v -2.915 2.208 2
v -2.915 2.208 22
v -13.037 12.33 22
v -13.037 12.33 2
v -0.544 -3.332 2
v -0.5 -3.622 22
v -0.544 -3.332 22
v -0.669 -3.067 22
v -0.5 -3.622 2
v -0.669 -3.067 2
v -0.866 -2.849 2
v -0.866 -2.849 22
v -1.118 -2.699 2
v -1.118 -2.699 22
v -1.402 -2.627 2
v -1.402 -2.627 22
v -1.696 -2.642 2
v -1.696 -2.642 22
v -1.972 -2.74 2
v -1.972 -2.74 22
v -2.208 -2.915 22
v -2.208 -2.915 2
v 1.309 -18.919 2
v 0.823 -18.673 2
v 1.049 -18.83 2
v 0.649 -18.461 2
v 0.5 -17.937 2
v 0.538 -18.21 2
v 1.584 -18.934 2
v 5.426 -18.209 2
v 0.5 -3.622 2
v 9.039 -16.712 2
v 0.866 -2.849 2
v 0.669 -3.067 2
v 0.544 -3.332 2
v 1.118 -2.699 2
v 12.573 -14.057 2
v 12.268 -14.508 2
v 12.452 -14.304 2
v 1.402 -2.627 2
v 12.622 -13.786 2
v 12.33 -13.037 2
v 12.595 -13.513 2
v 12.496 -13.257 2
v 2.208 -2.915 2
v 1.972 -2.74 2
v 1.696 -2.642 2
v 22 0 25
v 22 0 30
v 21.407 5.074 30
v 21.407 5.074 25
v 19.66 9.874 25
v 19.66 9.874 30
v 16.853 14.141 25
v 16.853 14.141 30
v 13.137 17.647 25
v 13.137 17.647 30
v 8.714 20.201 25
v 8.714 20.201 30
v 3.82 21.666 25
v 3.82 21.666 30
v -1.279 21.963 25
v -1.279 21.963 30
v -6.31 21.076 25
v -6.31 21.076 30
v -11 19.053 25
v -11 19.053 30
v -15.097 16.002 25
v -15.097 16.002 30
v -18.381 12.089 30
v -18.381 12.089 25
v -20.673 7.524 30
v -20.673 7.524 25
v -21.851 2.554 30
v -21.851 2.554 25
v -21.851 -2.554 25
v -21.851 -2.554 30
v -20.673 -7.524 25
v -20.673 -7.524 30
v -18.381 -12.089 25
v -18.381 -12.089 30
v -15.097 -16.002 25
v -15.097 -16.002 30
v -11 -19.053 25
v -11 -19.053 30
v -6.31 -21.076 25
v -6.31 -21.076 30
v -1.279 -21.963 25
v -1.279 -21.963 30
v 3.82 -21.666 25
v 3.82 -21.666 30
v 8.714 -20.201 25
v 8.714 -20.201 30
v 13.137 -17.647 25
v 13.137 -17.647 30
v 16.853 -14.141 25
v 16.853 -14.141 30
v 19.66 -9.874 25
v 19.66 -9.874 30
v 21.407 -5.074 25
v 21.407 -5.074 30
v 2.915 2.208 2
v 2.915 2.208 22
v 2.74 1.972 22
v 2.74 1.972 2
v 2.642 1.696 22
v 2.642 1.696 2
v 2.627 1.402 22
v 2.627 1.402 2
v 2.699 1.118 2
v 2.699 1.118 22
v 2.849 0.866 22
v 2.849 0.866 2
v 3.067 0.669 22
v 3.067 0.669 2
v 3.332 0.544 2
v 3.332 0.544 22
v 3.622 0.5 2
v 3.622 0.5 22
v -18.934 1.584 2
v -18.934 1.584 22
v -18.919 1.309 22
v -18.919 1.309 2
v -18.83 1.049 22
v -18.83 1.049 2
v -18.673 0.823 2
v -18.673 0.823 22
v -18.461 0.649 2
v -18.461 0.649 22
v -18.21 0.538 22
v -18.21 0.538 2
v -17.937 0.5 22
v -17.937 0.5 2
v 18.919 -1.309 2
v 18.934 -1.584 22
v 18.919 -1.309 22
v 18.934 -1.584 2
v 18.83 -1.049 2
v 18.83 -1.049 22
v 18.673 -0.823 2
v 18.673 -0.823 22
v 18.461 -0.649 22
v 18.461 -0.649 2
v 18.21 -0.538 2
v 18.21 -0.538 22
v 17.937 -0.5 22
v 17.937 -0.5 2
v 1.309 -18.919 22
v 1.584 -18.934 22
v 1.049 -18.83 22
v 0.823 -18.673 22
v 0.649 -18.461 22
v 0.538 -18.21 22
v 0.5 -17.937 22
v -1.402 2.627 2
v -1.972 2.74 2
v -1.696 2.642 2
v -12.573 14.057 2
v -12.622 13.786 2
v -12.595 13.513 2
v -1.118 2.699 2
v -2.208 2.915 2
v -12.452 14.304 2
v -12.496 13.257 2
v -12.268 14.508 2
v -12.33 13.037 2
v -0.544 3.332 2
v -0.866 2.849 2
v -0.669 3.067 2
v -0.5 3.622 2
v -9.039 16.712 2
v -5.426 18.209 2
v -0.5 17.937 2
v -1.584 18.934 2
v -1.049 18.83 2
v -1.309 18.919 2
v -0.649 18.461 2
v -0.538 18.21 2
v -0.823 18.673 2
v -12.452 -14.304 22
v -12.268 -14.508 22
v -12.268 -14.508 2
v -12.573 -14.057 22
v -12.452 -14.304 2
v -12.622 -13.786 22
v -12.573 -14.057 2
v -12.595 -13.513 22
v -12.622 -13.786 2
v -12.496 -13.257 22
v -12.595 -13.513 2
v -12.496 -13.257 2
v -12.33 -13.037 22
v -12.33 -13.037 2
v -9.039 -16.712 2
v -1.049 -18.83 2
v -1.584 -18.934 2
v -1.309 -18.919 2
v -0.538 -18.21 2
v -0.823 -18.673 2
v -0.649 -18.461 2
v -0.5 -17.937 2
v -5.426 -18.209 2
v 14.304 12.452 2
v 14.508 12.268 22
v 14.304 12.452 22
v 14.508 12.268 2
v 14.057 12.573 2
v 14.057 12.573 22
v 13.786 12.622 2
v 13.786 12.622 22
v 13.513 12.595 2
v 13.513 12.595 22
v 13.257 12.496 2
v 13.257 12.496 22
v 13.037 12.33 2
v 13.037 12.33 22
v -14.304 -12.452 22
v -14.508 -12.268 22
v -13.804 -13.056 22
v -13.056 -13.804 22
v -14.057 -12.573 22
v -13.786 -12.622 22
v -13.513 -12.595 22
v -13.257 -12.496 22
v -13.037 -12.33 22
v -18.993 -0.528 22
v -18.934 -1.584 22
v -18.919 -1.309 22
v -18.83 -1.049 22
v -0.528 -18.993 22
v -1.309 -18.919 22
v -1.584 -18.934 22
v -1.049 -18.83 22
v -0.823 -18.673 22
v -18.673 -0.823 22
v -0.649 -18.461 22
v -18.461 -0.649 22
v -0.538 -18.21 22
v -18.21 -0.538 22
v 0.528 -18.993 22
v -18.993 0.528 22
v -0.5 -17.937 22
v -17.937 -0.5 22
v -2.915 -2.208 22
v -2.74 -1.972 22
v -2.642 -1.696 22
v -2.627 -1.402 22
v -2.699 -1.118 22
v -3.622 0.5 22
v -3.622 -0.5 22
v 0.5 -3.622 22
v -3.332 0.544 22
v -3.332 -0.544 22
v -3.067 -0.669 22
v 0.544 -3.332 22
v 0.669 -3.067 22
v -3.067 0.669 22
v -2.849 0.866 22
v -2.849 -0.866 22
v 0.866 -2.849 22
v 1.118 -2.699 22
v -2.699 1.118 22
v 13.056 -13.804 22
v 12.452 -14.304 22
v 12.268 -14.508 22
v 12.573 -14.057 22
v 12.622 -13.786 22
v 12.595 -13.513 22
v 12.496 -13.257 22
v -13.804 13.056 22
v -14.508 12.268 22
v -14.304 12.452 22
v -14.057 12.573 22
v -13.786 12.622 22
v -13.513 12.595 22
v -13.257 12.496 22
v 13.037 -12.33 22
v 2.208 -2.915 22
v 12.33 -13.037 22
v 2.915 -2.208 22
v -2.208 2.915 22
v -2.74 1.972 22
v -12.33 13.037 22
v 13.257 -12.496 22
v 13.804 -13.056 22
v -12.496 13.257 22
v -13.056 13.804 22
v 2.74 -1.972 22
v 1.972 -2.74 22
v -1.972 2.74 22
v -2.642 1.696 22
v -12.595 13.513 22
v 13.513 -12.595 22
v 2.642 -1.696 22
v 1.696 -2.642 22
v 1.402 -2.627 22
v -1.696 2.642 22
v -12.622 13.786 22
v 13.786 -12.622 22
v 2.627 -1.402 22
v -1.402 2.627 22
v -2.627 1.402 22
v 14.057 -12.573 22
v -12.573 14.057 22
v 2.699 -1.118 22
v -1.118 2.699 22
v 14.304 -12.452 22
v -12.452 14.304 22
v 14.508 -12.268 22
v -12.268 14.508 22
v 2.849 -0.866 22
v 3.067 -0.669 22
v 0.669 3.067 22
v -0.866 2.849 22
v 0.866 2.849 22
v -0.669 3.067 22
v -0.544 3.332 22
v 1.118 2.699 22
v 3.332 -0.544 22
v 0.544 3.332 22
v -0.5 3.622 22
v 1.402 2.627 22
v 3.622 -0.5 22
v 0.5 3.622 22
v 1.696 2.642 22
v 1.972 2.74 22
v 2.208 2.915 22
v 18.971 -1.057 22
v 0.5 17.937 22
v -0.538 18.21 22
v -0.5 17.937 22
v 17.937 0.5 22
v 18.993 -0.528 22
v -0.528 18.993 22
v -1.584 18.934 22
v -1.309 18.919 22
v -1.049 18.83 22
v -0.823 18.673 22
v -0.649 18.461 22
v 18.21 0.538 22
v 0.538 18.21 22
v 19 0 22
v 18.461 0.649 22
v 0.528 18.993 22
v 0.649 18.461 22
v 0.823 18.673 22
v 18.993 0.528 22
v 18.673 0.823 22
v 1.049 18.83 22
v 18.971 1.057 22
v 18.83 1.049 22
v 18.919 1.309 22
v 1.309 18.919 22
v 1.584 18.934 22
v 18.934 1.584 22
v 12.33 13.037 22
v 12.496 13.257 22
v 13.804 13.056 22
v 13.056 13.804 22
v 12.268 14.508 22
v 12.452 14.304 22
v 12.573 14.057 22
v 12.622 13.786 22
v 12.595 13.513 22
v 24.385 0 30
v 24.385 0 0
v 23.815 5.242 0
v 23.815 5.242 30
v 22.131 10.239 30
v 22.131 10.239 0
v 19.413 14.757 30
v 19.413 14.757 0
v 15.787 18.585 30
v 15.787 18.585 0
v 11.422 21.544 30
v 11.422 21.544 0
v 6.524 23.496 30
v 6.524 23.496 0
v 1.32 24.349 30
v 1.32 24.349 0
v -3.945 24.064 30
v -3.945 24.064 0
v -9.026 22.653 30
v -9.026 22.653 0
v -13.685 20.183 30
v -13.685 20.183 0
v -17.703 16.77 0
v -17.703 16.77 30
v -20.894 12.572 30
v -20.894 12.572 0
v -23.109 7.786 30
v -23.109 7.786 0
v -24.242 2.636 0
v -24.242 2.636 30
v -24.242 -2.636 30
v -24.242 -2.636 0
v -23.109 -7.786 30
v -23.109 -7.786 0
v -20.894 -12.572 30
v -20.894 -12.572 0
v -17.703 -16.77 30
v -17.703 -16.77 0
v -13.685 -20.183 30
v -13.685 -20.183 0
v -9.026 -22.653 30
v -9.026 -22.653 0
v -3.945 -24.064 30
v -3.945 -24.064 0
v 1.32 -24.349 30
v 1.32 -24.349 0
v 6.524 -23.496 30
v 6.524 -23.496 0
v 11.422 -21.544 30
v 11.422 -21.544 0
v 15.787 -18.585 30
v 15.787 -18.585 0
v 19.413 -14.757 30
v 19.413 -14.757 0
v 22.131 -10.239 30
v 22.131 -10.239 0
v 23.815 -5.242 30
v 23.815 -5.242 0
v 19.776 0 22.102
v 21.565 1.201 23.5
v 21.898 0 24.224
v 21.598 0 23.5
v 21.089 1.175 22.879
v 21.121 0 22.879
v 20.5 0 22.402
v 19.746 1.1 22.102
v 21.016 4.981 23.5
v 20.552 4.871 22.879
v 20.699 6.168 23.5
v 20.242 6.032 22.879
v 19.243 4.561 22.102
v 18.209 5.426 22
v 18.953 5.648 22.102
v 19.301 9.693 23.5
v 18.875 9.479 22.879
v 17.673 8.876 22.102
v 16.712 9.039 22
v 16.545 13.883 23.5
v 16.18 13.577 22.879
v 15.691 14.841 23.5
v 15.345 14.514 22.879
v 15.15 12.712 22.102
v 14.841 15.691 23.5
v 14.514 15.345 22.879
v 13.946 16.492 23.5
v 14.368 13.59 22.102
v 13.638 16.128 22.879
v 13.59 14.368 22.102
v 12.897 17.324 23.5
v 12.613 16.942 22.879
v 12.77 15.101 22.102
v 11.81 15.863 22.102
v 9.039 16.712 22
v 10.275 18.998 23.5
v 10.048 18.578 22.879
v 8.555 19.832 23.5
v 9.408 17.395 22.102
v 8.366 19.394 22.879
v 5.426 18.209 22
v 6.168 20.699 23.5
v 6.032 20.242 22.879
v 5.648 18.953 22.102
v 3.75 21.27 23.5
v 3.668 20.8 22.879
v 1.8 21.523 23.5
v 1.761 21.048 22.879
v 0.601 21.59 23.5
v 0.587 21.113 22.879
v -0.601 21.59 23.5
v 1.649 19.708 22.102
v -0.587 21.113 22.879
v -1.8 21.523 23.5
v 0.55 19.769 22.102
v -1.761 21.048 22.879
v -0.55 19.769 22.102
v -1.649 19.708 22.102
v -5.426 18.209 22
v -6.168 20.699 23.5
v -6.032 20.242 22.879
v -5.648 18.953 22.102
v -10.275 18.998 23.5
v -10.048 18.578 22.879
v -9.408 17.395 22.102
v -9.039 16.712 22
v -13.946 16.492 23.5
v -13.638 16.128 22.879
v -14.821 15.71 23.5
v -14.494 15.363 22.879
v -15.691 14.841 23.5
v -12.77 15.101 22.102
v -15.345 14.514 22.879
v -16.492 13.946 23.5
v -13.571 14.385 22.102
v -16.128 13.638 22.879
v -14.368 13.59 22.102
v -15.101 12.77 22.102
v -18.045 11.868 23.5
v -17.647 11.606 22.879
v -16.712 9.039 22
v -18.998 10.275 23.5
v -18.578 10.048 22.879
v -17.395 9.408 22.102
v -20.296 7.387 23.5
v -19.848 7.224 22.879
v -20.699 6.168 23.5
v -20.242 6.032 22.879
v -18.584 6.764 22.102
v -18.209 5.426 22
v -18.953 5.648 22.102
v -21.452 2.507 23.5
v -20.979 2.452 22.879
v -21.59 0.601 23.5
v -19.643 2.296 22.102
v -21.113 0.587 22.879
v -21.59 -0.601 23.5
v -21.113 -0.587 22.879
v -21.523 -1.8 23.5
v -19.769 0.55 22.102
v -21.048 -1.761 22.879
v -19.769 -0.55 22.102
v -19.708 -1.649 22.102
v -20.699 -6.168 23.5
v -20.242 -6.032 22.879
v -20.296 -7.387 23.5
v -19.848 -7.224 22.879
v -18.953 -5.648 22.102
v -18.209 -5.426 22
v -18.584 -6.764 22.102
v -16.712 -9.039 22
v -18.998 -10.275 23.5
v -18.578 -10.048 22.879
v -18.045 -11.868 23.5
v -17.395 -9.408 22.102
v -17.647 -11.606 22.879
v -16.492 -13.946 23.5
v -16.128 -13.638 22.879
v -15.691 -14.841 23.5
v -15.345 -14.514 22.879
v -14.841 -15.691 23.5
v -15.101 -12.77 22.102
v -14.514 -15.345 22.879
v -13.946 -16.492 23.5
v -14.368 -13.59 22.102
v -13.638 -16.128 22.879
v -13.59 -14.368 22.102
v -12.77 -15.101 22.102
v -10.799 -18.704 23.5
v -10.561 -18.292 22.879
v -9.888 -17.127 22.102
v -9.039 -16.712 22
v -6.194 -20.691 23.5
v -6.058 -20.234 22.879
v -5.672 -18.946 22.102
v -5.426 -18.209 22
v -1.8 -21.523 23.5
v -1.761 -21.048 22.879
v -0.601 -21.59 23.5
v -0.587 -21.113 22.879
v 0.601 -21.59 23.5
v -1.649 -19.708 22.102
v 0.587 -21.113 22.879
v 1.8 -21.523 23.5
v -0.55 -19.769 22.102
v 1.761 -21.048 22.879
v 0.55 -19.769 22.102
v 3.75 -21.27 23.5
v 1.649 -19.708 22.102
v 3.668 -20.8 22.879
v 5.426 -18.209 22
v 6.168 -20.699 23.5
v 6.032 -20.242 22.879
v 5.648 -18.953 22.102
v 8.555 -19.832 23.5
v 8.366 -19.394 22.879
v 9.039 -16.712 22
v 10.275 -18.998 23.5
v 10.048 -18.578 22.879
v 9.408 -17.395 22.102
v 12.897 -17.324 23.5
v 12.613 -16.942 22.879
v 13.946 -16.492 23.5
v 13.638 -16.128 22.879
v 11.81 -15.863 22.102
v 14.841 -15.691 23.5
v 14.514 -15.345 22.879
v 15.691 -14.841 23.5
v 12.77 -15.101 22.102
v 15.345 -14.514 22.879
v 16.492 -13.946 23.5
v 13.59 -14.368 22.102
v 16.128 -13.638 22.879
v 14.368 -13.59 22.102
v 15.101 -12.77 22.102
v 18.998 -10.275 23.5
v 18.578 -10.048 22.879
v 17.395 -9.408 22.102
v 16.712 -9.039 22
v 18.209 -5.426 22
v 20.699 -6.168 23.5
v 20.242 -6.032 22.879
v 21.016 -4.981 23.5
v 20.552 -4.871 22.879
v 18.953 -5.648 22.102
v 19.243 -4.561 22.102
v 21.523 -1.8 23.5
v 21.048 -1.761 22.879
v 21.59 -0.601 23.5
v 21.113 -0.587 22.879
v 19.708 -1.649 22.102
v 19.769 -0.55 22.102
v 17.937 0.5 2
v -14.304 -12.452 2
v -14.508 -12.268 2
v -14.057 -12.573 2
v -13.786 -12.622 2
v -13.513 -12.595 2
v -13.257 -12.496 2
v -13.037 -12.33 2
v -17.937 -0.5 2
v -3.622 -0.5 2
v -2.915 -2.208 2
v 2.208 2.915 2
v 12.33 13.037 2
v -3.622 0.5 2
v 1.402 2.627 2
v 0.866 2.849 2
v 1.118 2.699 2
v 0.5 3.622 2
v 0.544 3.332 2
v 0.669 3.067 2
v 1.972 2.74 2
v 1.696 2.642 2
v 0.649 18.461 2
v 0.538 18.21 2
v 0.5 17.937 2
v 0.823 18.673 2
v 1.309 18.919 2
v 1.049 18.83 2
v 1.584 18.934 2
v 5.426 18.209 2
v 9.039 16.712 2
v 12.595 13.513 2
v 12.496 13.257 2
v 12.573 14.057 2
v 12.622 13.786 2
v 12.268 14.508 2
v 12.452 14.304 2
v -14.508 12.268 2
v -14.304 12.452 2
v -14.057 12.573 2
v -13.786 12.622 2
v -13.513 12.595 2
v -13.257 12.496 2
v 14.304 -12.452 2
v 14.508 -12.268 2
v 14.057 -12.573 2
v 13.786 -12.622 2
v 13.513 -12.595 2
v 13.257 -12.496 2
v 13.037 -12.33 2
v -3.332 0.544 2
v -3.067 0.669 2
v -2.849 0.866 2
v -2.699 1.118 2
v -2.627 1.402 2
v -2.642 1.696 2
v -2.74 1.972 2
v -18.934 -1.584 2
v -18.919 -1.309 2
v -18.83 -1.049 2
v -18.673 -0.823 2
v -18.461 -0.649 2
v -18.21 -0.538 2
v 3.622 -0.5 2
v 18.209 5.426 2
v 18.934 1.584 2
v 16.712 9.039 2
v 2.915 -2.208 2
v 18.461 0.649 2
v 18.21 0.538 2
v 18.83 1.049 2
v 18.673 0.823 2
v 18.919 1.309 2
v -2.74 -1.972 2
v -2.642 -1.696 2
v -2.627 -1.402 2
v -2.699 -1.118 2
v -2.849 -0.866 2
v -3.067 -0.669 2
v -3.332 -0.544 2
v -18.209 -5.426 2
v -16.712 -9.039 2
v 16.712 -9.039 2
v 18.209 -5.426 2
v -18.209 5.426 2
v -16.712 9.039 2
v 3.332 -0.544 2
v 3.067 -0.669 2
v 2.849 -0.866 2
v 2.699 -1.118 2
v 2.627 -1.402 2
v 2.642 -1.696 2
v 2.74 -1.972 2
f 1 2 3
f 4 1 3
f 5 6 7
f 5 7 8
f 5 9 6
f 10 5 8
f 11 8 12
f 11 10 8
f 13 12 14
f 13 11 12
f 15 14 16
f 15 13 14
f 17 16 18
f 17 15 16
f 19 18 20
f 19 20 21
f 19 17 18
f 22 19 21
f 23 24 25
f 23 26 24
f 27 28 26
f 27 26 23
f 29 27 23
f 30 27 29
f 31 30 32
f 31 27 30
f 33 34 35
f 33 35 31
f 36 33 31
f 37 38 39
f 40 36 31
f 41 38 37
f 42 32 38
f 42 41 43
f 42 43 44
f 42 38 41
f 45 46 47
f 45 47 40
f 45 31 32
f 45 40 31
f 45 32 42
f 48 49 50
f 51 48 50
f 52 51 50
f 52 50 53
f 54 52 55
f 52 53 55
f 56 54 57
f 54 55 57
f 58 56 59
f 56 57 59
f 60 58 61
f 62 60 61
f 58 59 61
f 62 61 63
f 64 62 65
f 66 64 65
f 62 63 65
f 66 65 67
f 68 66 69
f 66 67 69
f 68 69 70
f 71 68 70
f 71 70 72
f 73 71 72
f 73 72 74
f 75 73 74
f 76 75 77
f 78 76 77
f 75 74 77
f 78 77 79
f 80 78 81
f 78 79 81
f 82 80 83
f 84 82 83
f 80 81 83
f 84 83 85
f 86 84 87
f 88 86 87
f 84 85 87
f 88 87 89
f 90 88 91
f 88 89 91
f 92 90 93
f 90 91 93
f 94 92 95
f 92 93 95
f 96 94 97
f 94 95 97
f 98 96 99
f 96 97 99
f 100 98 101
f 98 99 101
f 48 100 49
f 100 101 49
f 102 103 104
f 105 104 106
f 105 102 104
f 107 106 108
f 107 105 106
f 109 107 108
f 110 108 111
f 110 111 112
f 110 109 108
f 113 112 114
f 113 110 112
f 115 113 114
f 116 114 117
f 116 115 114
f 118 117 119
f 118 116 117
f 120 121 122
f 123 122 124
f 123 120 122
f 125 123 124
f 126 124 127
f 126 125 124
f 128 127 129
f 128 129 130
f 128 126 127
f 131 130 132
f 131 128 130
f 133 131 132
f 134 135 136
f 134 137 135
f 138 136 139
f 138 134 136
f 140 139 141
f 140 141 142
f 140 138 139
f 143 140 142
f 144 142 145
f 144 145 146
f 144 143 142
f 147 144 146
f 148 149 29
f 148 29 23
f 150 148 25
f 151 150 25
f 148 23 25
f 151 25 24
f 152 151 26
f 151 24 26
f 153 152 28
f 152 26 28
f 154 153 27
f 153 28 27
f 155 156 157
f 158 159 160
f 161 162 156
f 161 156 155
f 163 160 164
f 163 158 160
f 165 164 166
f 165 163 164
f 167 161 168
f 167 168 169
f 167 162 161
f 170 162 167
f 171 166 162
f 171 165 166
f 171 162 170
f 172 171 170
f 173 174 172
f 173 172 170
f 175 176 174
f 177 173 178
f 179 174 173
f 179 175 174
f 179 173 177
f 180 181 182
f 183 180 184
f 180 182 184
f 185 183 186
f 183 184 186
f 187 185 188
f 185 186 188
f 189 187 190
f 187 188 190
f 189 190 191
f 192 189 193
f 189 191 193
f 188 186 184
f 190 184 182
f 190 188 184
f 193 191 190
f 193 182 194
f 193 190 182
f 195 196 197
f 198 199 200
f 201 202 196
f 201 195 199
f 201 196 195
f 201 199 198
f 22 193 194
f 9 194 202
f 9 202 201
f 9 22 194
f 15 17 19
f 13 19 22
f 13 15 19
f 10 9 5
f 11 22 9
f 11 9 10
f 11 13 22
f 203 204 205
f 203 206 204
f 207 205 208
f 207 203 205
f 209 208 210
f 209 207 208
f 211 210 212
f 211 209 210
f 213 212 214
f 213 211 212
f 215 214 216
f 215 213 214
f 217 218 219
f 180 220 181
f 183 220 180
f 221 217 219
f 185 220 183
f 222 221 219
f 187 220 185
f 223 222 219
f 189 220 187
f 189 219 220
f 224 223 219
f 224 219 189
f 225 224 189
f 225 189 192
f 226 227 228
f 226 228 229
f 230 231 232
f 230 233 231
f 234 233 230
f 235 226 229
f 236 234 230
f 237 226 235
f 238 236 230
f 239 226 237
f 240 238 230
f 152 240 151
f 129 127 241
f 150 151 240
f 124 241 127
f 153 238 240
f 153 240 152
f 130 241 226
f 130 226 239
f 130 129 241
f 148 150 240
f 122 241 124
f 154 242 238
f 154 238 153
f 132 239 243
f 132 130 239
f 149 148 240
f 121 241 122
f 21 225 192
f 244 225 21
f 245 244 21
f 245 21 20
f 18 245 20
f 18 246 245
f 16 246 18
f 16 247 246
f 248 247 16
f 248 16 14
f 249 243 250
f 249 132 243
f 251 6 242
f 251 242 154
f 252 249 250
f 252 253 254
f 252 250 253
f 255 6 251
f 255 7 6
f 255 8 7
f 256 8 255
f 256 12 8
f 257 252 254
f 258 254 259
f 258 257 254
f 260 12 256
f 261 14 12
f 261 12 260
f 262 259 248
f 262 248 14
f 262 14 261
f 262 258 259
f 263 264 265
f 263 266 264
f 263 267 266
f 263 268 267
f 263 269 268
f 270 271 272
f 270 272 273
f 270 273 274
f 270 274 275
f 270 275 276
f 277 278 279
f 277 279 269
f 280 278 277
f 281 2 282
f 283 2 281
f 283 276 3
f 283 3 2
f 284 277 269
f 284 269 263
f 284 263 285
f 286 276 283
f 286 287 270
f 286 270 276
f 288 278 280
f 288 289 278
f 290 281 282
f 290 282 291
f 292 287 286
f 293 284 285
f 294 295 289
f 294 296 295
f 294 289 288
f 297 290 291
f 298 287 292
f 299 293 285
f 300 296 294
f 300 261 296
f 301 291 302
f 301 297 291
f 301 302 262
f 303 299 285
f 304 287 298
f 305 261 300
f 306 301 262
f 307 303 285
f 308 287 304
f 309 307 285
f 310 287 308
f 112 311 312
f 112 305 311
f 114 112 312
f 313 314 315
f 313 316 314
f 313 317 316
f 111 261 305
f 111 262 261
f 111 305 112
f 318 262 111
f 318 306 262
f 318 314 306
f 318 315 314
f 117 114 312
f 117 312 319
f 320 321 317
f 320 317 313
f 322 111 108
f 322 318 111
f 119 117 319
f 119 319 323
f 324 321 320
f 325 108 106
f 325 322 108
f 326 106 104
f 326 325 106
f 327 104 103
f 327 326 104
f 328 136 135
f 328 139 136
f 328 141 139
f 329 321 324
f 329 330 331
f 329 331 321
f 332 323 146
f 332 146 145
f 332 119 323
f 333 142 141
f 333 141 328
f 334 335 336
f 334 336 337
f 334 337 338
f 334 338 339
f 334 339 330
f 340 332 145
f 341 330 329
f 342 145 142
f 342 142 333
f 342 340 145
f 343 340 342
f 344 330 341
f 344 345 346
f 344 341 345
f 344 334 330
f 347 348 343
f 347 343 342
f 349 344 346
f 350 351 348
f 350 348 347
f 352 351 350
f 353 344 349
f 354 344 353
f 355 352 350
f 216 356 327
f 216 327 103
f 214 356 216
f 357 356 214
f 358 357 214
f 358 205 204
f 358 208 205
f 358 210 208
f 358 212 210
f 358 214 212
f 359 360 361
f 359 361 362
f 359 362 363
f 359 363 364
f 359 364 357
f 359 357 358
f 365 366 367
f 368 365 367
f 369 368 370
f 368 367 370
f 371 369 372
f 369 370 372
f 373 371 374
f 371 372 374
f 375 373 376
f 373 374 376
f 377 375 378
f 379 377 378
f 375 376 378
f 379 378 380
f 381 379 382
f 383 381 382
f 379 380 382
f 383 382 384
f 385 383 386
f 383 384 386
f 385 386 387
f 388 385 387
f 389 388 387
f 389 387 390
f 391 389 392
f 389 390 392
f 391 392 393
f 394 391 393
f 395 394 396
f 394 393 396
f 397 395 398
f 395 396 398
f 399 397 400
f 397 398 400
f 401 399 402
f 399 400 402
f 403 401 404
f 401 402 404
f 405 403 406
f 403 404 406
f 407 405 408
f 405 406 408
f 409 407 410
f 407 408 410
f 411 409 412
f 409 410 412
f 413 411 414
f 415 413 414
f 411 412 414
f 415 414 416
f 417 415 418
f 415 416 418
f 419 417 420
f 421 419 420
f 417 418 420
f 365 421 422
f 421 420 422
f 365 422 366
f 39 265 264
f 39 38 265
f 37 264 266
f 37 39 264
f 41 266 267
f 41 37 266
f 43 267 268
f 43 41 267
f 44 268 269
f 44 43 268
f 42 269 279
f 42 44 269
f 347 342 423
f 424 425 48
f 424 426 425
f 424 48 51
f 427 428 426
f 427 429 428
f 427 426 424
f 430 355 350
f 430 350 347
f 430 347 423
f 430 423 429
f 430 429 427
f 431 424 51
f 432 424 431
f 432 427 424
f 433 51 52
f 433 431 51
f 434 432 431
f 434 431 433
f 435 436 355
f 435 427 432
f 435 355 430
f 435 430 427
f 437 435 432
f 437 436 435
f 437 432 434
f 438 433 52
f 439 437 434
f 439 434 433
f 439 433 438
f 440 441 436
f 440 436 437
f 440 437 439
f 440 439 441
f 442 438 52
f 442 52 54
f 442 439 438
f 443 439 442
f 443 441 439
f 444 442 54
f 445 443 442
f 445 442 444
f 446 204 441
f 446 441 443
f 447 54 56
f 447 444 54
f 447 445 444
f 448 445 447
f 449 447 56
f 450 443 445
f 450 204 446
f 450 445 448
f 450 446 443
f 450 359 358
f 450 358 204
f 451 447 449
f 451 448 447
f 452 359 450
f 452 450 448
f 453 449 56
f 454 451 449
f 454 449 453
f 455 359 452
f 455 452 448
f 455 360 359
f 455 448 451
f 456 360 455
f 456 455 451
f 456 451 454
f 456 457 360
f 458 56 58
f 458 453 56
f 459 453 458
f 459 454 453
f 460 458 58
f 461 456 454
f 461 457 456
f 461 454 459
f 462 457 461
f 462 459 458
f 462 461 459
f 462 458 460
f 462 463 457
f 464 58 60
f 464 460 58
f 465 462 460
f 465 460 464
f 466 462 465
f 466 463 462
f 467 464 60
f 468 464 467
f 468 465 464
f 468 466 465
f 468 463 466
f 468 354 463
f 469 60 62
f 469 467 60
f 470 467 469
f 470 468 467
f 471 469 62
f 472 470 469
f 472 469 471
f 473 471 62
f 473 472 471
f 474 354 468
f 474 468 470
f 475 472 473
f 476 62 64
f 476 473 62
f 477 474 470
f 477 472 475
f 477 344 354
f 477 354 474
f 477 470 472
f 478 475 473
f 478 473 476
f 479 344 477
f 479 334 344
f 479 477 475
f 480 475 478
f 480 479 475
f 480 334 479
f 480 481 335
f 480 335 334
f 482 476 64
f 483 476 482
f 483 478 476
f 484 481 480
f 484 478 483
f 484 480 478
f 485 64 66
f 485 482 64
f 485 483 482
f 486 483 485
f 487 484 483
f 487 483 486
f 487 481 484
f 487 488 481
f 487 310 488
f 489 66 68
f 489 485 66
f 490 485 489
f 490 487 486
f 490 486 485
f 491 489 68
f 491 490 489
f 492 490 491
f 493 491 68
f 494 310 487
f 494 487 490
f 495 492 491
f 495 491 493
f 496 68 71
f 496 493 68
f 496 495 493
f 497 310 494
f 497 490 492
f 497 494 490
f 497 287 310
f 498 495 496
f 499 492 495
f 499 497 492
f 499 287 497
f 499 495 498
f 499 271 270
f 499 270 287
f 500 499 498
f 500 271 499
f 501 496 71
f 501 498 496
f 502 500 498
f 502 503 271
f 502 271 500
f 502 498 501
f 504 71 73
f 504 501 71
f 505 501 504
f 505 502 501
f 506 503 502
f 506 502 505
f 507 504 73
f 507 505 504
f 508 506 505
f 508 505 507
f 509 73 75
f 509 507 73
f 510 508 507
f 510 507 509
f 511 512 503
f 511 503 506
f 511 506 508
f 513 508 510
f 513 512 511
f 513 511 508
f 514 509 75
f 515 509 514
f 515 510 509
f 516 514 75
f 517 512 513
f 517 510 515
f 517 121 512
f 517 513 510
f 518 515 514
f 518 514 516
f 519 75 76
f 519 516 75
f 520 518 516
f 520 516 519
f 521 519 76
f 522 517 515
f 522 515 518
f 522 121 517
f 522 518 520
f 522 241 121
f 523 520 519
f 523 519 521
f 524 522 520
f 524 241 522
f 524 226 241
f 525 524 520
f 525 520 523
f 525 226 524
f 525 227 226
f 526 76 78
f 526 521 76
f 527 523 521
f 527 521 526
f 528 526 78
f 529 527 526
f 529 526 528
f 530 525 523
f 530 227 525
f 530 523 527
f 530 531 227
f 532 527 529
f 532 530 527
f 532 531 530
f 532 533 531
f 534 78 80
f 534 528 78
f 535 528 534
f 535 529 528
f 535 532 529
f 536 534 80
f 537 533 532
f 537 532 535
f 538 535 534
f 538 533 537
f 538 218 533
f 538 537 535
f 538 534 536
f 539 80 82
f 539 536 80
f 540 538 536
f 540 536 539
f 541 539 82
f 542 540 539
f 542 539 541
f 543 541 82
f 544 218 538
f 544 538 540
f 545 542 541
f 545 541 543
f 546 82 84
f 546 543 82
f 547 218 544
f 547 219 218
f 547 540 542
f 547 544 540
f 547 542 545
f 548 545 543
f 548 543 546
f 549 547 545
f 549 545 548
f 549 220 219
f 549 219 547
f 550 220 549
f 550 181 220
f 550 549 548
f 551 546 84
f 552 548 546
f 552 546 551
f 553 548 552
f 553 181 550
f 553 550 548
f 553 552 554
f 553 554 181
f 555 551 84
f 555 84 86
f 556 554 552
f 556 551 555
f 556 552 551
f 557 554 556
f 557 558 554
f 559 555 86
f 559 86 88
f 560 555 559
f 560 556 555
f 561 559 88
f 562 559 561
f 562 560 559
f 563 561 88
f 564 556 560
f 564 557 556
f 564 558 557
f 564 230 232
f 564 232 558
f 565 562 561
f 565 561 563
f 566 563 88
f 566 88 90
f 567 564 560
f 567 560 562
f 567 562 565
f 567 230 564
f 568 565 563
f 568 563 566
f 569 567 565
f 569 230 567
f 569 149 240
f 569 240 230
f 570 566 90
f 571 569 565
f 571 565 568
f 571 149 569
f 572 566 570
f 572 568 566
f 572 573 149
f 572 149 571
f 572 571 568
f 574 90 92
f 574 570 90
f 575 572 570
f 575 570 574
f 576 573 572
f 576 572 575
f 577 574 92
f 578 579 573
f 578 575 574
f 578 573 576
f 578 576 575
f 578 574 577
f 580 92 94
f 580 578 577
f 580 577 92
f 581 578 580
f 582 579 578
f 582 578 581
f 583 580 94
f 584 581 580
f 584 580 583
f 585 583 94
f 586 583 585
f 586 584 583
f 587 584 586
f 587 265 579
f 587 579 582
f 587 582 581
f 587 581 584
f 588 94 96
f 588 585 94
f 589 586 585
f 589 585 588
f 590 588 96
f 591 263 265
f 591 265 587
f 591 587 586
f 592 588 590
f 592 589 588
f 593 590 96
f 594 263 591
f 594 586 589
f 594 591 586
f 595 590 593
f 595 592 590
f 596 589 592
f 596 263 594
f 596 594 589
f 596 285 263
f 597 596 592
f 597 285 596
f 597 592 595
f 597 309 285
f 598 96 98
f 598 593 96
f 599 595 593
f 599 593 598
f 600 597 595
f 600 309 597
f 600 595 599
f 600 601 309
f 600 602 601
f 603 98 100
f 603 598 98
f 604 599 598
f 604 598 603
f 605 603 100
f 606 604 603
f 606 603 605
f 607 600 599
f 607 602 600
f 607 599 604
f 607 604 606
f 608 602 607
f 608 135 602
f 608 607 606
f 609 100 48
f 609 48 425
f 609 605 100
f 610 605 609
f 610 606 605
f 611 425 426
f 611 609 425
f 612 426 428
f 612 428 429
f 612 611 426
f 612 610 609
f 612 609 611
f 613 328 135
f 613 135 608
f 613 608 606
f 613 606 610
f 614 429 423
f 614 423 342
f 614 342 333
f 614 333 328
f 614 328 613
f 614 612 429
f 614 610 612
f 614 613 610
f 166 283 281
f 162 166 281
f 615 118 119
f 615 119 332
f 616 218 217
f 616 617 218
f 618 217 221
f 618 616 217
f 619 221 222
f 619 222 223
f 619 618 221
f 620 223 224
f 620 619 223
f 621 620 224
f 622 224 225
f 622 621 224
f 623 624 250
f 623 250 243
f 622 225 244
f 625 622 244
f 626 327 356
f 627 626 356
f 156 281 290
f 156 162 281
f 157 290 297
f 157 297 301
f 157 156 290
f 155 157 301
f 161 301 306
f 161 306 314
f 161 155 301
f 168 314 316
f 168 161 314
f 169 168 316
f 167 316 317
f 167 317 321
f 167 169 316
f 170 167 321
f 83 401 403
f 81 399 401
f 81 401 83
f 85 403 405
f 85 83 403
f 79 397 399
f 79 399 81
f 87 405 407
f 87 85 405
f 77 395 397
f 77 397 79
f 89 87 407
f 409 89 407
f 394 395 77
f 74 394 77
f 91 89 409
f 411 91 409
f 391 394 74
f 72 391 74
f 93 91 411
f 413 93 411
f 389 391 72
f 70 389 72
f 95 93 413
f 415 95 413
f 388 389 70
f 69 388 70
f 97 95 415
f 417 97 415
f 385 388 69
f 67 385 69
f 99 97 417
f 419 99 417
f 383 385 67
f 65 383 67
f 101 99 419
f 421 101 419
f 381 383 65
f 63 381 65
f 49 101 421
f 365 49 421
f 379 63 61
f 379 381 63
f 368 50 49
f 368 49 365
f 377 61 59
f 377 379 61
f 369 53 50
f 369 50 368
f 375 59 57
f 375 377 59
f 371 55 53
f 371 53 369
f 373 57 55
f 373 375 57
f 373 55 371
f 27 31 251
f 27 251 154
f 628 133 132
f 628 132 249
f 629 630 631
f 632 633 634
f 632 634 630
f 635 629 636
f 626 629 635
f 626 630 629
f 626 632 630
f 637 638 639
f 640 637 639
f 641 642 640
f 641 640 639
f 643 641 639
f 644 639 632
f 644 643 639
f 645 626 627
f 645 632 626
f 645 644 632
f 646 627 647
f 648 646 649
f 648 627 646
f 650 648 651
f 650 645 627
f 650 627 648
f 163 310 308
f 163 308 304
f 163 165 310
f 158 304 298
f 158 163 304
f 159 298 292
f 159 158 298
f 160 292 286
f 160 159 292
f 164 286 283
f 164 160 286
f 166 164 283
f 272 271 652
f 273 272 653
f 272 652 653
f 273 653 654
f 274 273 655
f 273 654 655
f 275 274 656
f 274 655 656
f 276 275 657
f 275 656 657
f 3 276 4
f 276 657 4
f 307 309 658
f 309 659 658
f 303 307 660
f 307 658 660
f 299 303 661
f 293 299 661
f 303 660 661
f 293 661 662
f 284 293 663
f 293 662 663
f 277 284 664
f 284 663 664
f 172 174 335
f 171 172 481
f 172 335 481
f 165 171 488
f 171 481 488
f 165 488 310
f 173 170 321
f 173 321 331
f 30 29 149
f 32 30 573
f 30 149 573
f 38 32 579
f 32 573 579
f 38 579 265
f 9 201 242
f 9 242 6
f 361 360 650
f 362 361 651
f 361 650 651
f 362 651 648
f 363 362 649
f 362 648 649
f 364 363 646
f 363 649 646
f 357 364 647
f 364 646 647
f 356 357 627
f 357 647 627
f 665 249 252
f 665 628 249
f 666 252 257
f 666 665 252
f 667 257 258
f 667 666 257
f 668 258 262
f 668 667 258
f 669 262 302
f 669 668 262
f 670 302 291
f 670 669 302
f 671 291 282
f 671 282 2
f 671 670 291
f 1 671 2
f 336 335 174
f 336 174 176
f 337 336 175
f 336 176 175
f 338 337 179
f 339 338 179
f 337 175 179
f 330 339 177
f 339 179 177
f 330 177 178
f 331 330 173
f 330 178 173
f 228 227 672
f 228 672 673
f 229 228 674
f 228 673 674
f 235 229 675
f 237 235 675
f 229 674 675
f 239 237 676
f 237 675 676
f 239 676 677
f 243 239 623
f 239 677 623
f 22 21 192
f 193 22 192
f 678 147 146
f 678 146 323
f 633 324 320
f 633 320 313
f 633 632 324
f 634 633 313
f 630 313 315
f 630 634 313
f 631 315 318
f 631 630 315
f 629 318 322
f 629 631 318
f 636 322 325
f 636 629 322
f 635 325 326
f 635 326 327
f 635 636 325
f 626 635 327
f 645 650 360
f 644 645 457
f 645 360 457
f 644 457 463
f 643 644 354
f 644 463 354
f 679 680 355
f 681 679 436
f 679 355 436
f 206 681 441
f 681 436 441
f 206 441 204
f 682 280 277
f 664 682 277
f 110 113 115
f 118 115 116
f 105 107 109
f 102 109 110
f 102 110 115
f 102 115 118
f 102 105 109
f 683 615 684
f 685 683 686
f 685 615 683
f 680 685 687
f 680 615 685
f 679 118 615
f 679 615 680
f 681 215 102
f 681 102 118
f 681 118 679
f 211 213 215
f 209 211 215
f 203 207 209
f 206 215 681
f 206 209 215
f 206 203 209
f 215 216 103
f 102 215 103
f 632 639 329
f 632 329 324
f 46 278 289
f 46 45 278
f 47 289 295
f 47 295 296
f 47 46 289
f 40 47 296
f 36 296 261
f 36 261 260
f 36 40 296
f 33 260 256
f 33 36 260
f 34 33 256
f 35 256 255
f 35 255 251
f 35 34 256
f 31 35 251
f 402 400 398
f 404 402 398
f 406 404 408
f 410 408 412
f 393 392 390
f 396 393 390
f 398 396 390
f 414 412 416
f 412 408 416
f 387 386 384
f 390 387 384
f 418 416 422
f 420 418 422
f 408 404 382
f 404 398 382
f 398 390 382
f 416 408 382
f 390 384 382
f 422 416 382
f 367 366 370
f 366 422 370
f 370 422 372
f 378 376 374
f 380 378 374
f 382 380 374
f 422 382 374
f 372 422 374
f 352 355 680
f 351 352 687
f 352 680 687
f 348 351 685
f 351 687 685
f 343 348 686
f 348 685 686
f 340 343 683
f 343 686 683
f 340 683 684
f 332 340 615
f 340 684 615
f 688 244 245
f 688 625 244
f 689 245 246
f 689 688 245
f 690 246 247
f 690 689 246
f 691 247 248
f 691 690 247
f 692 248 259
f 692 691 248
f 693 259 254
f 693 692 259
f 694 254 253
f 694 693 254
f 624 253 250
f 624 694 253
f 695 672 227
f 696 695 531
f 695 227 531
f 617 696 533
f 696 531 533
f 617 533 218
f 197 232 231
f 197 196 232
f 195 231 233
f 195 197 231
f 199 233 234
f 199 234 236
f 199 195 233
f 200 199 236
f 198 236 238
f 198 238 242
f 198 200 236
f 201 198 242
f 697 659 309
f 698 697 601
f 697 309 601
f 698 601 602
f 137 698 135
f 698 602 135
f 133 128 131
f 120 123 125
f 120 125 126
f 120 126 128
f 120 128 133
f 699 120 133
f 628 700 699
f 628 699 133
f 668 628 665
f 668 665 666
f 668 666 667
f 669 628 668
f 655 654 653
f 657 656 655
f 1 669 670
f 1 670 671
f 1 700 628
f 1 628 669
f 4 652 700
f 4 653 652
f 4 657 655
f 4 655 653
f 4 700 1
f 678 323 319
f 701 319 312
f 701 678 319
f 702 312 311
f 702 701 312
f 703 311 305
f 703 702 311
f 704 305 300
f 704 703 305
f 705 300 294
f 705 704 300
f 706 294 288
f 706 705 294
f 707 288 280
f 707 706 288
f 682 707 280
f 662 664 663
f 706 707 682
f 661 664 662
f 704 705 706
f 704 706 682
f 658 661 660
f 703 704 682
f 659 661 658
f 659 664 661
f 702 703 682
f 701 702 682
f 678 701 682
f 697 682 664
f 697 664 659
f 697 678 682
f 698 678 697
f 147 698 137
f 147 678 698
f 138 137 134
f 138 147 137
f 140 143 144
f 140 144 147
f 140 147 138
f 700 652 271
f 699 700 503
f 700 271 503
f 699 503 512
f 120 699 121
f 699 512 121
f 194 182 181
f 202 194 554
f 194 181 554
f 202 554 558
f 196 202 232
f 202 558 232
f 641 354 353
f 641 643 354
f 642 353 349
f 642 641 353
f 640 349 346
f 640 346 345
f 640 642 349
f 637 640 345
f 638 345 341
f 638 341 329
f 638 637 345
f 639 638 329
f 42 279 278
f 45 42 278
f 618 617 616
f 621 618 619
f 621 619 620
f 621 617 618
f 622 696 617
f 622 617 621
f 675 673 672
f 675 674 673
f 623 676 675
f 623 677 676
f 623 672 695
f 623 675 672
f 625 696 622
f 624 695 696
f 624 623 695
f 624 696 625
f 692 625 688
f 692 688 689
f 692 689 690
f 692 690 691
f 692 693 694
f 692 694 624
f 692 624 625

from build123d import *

# Parameters (mm, degrees)
F0_R     = 24.385
F1_DEPTH = 30
F2_R     = 22
F3_DEPTH = 8
F4_R     = 3
F6_DEPTH = 20
F7_R     = 1


with BuildPart() as f1:
    # F0 (on Top) → F1 (new body)
    with BuildSketch(Plane.XY):
        Circle(F0_R)
    extrude(amount=F1_DEPTH)

    # F2 (on face) → F3 (cut)
    with BuildSketch(Plane.XY.offset(30)):
        Circle(F2_R)
    extrude(amount=-F3_DEPTH, mode=Mode.SUBTRACT)

    # F4
    f4_edges = [f1.edges().sort_by_distance(p)[0] for p in [
        (-22, 0, 22),
    ]]
    fillet(f4_edges, radius=F4_R)

    # F5 (on face) → F6 (cut)
    with BuildSketch(Plane.XY.offset(22)):
        with BuildLine():
            Line((-1.2082039889, -0.5004544783), (-18.9934079437, -0.5004544783))
            ThreePointArc((-18.9934079437, -0.5004544783), (-17.5537111177, -7.2709852149), (-13.7842423101, -13.0764927995))
            Line((-13.7842423101, -13.0764927995), (-1.2082039889, -0.5004544783))
        make_face()
        with BuildLine():
            ThreePointArc((-13.7842423101, 13.0764927995), (-17.5537111177, 7.2709852149), (-18.9934079437, 0.5004544783))
            Line((-18.9934079437, 0.5004544783), (-1.2082039889, 0.5004544783))
            Line((-1.2082039889, 0.5004544783), (-13.7842423101, 13.0764927995))
        make_face()
        with BuildLine():
            Line((-0.5004544783, -1.2082039889), (-13.0764927995, -13.7842423101))
            ThreePointArc((-13.0764927995, -13.7842423101), (-7.2709852149, -17.5537111177), (-0.5004544783, -18.9934079437))
            Line((-0.5004544783, -18.9934079437), (-0.5004544783, -1.2082039889))
        make_face()
        with BuildLine():
            Line((0.5004544783, -1.2082039889), (0.5004544783, -18.9934079437))
            ThreePointArc((0.5004544783, -18.9934079437), (7.2709852149, -17.5537111177), (13.0764927995, -13.7842423101))
            Line((13.0764927995, -13.7842423101), (0.5004544783, -1.2082039889))
        make_face()
        with BuildLine():
            Line((1.2082039889, -0.5004544783), (13.7842423101, -13.0764927995))
            ThreePointArc((13.7842423101, -13.0764927995), (17.5537111177, -7.2709852149), (18.9934079437, -0.5004544783))
            Line((18.9934079437, -0.5004544783), (1.2082039889, -0.5004544783))
        make_face()
        with BuildLine():
            Line((1.2082039889, 0.5004544783), (18.9934079437, 0.5004544783))
            ThreePointArc((18.9934079437, 0.5004544783), (17.5537111177, 7.2709852149), (13.7842423101, 13.0764927995))
            Line((13.7842423101, 13.0764927995), (1.2082039889, 0.5004544783))
        make_face()
        with BuildLine():
            Line((0.5004544783, 1.2082039889), (13.0764927995, 13.7842423101))
            ThreePointArc((13.0764927995, 13.7842423101), (7.2709852149, 17.5537111177), (0.5004544783, 18.9934079437))
            Line((0.5004544783, 18.9934079437), (0.5004544783, 1.2082039889))
        make_face()
        with BuildLine():
            Line((-0.5004544783, 1.2082039889), (-0.5004544783, 18.9934079437))
            ThreePointArc((-0.5004544783, 18.9934079437), (-7.2709852149, 17.5537111177), (-13.0764927995, 13.7842423101))
            Line((-13.0764927995, 13.7842423101), (-0.5004544783, 1.2082039889))
        make_face()
    extrude(amount=-F6_DEPTH, mode=Mode.SUBTRACT)

    # F7
    f7_edges = [f1.edges().sort_by_distance(p)[0] for p in [
        (-18.993408, 0.500454, 12),
        (-18.993408, -0.500454, 12),
        (-13.076493, 13.784242, 12),
        (-13.784242, 13.076493, 12),
        (0.500454, 18.993408, 12),
        (-0.500454, 18.993408, 12),
        (13.076493, 13.784242, 12),
        (13.784242, 13.076493, 12),
        (18.993408, 0.500454, 12),
        (18.993408, -0.500454, 12),
        (13.076493, -13.784242, 12),
        (13.784242, -13.076493, 12),
        (0.500454, -18.993408, 12),
        (-0.500454, -18.993408, 12),
        (-13.076493, -13.784242, 12),
        (-13.784242, -13.076493, 12),
        (-0.500454, -1.208204, 12),
        (-1.208204, -0.500454, 12),
        (-1.208204, 0.500454, 12),
        (-0.500454, 1.208204, 12),
        (0.500454, 1.208204, 12),
        (1.208204, 0.500454, 12),
        (1.208204, -0.500454, 12),
        (0.500454, -1.208204, 12),
    ]]
    fillet(f7_edges, radius=F7_R)


solid = f1.part
